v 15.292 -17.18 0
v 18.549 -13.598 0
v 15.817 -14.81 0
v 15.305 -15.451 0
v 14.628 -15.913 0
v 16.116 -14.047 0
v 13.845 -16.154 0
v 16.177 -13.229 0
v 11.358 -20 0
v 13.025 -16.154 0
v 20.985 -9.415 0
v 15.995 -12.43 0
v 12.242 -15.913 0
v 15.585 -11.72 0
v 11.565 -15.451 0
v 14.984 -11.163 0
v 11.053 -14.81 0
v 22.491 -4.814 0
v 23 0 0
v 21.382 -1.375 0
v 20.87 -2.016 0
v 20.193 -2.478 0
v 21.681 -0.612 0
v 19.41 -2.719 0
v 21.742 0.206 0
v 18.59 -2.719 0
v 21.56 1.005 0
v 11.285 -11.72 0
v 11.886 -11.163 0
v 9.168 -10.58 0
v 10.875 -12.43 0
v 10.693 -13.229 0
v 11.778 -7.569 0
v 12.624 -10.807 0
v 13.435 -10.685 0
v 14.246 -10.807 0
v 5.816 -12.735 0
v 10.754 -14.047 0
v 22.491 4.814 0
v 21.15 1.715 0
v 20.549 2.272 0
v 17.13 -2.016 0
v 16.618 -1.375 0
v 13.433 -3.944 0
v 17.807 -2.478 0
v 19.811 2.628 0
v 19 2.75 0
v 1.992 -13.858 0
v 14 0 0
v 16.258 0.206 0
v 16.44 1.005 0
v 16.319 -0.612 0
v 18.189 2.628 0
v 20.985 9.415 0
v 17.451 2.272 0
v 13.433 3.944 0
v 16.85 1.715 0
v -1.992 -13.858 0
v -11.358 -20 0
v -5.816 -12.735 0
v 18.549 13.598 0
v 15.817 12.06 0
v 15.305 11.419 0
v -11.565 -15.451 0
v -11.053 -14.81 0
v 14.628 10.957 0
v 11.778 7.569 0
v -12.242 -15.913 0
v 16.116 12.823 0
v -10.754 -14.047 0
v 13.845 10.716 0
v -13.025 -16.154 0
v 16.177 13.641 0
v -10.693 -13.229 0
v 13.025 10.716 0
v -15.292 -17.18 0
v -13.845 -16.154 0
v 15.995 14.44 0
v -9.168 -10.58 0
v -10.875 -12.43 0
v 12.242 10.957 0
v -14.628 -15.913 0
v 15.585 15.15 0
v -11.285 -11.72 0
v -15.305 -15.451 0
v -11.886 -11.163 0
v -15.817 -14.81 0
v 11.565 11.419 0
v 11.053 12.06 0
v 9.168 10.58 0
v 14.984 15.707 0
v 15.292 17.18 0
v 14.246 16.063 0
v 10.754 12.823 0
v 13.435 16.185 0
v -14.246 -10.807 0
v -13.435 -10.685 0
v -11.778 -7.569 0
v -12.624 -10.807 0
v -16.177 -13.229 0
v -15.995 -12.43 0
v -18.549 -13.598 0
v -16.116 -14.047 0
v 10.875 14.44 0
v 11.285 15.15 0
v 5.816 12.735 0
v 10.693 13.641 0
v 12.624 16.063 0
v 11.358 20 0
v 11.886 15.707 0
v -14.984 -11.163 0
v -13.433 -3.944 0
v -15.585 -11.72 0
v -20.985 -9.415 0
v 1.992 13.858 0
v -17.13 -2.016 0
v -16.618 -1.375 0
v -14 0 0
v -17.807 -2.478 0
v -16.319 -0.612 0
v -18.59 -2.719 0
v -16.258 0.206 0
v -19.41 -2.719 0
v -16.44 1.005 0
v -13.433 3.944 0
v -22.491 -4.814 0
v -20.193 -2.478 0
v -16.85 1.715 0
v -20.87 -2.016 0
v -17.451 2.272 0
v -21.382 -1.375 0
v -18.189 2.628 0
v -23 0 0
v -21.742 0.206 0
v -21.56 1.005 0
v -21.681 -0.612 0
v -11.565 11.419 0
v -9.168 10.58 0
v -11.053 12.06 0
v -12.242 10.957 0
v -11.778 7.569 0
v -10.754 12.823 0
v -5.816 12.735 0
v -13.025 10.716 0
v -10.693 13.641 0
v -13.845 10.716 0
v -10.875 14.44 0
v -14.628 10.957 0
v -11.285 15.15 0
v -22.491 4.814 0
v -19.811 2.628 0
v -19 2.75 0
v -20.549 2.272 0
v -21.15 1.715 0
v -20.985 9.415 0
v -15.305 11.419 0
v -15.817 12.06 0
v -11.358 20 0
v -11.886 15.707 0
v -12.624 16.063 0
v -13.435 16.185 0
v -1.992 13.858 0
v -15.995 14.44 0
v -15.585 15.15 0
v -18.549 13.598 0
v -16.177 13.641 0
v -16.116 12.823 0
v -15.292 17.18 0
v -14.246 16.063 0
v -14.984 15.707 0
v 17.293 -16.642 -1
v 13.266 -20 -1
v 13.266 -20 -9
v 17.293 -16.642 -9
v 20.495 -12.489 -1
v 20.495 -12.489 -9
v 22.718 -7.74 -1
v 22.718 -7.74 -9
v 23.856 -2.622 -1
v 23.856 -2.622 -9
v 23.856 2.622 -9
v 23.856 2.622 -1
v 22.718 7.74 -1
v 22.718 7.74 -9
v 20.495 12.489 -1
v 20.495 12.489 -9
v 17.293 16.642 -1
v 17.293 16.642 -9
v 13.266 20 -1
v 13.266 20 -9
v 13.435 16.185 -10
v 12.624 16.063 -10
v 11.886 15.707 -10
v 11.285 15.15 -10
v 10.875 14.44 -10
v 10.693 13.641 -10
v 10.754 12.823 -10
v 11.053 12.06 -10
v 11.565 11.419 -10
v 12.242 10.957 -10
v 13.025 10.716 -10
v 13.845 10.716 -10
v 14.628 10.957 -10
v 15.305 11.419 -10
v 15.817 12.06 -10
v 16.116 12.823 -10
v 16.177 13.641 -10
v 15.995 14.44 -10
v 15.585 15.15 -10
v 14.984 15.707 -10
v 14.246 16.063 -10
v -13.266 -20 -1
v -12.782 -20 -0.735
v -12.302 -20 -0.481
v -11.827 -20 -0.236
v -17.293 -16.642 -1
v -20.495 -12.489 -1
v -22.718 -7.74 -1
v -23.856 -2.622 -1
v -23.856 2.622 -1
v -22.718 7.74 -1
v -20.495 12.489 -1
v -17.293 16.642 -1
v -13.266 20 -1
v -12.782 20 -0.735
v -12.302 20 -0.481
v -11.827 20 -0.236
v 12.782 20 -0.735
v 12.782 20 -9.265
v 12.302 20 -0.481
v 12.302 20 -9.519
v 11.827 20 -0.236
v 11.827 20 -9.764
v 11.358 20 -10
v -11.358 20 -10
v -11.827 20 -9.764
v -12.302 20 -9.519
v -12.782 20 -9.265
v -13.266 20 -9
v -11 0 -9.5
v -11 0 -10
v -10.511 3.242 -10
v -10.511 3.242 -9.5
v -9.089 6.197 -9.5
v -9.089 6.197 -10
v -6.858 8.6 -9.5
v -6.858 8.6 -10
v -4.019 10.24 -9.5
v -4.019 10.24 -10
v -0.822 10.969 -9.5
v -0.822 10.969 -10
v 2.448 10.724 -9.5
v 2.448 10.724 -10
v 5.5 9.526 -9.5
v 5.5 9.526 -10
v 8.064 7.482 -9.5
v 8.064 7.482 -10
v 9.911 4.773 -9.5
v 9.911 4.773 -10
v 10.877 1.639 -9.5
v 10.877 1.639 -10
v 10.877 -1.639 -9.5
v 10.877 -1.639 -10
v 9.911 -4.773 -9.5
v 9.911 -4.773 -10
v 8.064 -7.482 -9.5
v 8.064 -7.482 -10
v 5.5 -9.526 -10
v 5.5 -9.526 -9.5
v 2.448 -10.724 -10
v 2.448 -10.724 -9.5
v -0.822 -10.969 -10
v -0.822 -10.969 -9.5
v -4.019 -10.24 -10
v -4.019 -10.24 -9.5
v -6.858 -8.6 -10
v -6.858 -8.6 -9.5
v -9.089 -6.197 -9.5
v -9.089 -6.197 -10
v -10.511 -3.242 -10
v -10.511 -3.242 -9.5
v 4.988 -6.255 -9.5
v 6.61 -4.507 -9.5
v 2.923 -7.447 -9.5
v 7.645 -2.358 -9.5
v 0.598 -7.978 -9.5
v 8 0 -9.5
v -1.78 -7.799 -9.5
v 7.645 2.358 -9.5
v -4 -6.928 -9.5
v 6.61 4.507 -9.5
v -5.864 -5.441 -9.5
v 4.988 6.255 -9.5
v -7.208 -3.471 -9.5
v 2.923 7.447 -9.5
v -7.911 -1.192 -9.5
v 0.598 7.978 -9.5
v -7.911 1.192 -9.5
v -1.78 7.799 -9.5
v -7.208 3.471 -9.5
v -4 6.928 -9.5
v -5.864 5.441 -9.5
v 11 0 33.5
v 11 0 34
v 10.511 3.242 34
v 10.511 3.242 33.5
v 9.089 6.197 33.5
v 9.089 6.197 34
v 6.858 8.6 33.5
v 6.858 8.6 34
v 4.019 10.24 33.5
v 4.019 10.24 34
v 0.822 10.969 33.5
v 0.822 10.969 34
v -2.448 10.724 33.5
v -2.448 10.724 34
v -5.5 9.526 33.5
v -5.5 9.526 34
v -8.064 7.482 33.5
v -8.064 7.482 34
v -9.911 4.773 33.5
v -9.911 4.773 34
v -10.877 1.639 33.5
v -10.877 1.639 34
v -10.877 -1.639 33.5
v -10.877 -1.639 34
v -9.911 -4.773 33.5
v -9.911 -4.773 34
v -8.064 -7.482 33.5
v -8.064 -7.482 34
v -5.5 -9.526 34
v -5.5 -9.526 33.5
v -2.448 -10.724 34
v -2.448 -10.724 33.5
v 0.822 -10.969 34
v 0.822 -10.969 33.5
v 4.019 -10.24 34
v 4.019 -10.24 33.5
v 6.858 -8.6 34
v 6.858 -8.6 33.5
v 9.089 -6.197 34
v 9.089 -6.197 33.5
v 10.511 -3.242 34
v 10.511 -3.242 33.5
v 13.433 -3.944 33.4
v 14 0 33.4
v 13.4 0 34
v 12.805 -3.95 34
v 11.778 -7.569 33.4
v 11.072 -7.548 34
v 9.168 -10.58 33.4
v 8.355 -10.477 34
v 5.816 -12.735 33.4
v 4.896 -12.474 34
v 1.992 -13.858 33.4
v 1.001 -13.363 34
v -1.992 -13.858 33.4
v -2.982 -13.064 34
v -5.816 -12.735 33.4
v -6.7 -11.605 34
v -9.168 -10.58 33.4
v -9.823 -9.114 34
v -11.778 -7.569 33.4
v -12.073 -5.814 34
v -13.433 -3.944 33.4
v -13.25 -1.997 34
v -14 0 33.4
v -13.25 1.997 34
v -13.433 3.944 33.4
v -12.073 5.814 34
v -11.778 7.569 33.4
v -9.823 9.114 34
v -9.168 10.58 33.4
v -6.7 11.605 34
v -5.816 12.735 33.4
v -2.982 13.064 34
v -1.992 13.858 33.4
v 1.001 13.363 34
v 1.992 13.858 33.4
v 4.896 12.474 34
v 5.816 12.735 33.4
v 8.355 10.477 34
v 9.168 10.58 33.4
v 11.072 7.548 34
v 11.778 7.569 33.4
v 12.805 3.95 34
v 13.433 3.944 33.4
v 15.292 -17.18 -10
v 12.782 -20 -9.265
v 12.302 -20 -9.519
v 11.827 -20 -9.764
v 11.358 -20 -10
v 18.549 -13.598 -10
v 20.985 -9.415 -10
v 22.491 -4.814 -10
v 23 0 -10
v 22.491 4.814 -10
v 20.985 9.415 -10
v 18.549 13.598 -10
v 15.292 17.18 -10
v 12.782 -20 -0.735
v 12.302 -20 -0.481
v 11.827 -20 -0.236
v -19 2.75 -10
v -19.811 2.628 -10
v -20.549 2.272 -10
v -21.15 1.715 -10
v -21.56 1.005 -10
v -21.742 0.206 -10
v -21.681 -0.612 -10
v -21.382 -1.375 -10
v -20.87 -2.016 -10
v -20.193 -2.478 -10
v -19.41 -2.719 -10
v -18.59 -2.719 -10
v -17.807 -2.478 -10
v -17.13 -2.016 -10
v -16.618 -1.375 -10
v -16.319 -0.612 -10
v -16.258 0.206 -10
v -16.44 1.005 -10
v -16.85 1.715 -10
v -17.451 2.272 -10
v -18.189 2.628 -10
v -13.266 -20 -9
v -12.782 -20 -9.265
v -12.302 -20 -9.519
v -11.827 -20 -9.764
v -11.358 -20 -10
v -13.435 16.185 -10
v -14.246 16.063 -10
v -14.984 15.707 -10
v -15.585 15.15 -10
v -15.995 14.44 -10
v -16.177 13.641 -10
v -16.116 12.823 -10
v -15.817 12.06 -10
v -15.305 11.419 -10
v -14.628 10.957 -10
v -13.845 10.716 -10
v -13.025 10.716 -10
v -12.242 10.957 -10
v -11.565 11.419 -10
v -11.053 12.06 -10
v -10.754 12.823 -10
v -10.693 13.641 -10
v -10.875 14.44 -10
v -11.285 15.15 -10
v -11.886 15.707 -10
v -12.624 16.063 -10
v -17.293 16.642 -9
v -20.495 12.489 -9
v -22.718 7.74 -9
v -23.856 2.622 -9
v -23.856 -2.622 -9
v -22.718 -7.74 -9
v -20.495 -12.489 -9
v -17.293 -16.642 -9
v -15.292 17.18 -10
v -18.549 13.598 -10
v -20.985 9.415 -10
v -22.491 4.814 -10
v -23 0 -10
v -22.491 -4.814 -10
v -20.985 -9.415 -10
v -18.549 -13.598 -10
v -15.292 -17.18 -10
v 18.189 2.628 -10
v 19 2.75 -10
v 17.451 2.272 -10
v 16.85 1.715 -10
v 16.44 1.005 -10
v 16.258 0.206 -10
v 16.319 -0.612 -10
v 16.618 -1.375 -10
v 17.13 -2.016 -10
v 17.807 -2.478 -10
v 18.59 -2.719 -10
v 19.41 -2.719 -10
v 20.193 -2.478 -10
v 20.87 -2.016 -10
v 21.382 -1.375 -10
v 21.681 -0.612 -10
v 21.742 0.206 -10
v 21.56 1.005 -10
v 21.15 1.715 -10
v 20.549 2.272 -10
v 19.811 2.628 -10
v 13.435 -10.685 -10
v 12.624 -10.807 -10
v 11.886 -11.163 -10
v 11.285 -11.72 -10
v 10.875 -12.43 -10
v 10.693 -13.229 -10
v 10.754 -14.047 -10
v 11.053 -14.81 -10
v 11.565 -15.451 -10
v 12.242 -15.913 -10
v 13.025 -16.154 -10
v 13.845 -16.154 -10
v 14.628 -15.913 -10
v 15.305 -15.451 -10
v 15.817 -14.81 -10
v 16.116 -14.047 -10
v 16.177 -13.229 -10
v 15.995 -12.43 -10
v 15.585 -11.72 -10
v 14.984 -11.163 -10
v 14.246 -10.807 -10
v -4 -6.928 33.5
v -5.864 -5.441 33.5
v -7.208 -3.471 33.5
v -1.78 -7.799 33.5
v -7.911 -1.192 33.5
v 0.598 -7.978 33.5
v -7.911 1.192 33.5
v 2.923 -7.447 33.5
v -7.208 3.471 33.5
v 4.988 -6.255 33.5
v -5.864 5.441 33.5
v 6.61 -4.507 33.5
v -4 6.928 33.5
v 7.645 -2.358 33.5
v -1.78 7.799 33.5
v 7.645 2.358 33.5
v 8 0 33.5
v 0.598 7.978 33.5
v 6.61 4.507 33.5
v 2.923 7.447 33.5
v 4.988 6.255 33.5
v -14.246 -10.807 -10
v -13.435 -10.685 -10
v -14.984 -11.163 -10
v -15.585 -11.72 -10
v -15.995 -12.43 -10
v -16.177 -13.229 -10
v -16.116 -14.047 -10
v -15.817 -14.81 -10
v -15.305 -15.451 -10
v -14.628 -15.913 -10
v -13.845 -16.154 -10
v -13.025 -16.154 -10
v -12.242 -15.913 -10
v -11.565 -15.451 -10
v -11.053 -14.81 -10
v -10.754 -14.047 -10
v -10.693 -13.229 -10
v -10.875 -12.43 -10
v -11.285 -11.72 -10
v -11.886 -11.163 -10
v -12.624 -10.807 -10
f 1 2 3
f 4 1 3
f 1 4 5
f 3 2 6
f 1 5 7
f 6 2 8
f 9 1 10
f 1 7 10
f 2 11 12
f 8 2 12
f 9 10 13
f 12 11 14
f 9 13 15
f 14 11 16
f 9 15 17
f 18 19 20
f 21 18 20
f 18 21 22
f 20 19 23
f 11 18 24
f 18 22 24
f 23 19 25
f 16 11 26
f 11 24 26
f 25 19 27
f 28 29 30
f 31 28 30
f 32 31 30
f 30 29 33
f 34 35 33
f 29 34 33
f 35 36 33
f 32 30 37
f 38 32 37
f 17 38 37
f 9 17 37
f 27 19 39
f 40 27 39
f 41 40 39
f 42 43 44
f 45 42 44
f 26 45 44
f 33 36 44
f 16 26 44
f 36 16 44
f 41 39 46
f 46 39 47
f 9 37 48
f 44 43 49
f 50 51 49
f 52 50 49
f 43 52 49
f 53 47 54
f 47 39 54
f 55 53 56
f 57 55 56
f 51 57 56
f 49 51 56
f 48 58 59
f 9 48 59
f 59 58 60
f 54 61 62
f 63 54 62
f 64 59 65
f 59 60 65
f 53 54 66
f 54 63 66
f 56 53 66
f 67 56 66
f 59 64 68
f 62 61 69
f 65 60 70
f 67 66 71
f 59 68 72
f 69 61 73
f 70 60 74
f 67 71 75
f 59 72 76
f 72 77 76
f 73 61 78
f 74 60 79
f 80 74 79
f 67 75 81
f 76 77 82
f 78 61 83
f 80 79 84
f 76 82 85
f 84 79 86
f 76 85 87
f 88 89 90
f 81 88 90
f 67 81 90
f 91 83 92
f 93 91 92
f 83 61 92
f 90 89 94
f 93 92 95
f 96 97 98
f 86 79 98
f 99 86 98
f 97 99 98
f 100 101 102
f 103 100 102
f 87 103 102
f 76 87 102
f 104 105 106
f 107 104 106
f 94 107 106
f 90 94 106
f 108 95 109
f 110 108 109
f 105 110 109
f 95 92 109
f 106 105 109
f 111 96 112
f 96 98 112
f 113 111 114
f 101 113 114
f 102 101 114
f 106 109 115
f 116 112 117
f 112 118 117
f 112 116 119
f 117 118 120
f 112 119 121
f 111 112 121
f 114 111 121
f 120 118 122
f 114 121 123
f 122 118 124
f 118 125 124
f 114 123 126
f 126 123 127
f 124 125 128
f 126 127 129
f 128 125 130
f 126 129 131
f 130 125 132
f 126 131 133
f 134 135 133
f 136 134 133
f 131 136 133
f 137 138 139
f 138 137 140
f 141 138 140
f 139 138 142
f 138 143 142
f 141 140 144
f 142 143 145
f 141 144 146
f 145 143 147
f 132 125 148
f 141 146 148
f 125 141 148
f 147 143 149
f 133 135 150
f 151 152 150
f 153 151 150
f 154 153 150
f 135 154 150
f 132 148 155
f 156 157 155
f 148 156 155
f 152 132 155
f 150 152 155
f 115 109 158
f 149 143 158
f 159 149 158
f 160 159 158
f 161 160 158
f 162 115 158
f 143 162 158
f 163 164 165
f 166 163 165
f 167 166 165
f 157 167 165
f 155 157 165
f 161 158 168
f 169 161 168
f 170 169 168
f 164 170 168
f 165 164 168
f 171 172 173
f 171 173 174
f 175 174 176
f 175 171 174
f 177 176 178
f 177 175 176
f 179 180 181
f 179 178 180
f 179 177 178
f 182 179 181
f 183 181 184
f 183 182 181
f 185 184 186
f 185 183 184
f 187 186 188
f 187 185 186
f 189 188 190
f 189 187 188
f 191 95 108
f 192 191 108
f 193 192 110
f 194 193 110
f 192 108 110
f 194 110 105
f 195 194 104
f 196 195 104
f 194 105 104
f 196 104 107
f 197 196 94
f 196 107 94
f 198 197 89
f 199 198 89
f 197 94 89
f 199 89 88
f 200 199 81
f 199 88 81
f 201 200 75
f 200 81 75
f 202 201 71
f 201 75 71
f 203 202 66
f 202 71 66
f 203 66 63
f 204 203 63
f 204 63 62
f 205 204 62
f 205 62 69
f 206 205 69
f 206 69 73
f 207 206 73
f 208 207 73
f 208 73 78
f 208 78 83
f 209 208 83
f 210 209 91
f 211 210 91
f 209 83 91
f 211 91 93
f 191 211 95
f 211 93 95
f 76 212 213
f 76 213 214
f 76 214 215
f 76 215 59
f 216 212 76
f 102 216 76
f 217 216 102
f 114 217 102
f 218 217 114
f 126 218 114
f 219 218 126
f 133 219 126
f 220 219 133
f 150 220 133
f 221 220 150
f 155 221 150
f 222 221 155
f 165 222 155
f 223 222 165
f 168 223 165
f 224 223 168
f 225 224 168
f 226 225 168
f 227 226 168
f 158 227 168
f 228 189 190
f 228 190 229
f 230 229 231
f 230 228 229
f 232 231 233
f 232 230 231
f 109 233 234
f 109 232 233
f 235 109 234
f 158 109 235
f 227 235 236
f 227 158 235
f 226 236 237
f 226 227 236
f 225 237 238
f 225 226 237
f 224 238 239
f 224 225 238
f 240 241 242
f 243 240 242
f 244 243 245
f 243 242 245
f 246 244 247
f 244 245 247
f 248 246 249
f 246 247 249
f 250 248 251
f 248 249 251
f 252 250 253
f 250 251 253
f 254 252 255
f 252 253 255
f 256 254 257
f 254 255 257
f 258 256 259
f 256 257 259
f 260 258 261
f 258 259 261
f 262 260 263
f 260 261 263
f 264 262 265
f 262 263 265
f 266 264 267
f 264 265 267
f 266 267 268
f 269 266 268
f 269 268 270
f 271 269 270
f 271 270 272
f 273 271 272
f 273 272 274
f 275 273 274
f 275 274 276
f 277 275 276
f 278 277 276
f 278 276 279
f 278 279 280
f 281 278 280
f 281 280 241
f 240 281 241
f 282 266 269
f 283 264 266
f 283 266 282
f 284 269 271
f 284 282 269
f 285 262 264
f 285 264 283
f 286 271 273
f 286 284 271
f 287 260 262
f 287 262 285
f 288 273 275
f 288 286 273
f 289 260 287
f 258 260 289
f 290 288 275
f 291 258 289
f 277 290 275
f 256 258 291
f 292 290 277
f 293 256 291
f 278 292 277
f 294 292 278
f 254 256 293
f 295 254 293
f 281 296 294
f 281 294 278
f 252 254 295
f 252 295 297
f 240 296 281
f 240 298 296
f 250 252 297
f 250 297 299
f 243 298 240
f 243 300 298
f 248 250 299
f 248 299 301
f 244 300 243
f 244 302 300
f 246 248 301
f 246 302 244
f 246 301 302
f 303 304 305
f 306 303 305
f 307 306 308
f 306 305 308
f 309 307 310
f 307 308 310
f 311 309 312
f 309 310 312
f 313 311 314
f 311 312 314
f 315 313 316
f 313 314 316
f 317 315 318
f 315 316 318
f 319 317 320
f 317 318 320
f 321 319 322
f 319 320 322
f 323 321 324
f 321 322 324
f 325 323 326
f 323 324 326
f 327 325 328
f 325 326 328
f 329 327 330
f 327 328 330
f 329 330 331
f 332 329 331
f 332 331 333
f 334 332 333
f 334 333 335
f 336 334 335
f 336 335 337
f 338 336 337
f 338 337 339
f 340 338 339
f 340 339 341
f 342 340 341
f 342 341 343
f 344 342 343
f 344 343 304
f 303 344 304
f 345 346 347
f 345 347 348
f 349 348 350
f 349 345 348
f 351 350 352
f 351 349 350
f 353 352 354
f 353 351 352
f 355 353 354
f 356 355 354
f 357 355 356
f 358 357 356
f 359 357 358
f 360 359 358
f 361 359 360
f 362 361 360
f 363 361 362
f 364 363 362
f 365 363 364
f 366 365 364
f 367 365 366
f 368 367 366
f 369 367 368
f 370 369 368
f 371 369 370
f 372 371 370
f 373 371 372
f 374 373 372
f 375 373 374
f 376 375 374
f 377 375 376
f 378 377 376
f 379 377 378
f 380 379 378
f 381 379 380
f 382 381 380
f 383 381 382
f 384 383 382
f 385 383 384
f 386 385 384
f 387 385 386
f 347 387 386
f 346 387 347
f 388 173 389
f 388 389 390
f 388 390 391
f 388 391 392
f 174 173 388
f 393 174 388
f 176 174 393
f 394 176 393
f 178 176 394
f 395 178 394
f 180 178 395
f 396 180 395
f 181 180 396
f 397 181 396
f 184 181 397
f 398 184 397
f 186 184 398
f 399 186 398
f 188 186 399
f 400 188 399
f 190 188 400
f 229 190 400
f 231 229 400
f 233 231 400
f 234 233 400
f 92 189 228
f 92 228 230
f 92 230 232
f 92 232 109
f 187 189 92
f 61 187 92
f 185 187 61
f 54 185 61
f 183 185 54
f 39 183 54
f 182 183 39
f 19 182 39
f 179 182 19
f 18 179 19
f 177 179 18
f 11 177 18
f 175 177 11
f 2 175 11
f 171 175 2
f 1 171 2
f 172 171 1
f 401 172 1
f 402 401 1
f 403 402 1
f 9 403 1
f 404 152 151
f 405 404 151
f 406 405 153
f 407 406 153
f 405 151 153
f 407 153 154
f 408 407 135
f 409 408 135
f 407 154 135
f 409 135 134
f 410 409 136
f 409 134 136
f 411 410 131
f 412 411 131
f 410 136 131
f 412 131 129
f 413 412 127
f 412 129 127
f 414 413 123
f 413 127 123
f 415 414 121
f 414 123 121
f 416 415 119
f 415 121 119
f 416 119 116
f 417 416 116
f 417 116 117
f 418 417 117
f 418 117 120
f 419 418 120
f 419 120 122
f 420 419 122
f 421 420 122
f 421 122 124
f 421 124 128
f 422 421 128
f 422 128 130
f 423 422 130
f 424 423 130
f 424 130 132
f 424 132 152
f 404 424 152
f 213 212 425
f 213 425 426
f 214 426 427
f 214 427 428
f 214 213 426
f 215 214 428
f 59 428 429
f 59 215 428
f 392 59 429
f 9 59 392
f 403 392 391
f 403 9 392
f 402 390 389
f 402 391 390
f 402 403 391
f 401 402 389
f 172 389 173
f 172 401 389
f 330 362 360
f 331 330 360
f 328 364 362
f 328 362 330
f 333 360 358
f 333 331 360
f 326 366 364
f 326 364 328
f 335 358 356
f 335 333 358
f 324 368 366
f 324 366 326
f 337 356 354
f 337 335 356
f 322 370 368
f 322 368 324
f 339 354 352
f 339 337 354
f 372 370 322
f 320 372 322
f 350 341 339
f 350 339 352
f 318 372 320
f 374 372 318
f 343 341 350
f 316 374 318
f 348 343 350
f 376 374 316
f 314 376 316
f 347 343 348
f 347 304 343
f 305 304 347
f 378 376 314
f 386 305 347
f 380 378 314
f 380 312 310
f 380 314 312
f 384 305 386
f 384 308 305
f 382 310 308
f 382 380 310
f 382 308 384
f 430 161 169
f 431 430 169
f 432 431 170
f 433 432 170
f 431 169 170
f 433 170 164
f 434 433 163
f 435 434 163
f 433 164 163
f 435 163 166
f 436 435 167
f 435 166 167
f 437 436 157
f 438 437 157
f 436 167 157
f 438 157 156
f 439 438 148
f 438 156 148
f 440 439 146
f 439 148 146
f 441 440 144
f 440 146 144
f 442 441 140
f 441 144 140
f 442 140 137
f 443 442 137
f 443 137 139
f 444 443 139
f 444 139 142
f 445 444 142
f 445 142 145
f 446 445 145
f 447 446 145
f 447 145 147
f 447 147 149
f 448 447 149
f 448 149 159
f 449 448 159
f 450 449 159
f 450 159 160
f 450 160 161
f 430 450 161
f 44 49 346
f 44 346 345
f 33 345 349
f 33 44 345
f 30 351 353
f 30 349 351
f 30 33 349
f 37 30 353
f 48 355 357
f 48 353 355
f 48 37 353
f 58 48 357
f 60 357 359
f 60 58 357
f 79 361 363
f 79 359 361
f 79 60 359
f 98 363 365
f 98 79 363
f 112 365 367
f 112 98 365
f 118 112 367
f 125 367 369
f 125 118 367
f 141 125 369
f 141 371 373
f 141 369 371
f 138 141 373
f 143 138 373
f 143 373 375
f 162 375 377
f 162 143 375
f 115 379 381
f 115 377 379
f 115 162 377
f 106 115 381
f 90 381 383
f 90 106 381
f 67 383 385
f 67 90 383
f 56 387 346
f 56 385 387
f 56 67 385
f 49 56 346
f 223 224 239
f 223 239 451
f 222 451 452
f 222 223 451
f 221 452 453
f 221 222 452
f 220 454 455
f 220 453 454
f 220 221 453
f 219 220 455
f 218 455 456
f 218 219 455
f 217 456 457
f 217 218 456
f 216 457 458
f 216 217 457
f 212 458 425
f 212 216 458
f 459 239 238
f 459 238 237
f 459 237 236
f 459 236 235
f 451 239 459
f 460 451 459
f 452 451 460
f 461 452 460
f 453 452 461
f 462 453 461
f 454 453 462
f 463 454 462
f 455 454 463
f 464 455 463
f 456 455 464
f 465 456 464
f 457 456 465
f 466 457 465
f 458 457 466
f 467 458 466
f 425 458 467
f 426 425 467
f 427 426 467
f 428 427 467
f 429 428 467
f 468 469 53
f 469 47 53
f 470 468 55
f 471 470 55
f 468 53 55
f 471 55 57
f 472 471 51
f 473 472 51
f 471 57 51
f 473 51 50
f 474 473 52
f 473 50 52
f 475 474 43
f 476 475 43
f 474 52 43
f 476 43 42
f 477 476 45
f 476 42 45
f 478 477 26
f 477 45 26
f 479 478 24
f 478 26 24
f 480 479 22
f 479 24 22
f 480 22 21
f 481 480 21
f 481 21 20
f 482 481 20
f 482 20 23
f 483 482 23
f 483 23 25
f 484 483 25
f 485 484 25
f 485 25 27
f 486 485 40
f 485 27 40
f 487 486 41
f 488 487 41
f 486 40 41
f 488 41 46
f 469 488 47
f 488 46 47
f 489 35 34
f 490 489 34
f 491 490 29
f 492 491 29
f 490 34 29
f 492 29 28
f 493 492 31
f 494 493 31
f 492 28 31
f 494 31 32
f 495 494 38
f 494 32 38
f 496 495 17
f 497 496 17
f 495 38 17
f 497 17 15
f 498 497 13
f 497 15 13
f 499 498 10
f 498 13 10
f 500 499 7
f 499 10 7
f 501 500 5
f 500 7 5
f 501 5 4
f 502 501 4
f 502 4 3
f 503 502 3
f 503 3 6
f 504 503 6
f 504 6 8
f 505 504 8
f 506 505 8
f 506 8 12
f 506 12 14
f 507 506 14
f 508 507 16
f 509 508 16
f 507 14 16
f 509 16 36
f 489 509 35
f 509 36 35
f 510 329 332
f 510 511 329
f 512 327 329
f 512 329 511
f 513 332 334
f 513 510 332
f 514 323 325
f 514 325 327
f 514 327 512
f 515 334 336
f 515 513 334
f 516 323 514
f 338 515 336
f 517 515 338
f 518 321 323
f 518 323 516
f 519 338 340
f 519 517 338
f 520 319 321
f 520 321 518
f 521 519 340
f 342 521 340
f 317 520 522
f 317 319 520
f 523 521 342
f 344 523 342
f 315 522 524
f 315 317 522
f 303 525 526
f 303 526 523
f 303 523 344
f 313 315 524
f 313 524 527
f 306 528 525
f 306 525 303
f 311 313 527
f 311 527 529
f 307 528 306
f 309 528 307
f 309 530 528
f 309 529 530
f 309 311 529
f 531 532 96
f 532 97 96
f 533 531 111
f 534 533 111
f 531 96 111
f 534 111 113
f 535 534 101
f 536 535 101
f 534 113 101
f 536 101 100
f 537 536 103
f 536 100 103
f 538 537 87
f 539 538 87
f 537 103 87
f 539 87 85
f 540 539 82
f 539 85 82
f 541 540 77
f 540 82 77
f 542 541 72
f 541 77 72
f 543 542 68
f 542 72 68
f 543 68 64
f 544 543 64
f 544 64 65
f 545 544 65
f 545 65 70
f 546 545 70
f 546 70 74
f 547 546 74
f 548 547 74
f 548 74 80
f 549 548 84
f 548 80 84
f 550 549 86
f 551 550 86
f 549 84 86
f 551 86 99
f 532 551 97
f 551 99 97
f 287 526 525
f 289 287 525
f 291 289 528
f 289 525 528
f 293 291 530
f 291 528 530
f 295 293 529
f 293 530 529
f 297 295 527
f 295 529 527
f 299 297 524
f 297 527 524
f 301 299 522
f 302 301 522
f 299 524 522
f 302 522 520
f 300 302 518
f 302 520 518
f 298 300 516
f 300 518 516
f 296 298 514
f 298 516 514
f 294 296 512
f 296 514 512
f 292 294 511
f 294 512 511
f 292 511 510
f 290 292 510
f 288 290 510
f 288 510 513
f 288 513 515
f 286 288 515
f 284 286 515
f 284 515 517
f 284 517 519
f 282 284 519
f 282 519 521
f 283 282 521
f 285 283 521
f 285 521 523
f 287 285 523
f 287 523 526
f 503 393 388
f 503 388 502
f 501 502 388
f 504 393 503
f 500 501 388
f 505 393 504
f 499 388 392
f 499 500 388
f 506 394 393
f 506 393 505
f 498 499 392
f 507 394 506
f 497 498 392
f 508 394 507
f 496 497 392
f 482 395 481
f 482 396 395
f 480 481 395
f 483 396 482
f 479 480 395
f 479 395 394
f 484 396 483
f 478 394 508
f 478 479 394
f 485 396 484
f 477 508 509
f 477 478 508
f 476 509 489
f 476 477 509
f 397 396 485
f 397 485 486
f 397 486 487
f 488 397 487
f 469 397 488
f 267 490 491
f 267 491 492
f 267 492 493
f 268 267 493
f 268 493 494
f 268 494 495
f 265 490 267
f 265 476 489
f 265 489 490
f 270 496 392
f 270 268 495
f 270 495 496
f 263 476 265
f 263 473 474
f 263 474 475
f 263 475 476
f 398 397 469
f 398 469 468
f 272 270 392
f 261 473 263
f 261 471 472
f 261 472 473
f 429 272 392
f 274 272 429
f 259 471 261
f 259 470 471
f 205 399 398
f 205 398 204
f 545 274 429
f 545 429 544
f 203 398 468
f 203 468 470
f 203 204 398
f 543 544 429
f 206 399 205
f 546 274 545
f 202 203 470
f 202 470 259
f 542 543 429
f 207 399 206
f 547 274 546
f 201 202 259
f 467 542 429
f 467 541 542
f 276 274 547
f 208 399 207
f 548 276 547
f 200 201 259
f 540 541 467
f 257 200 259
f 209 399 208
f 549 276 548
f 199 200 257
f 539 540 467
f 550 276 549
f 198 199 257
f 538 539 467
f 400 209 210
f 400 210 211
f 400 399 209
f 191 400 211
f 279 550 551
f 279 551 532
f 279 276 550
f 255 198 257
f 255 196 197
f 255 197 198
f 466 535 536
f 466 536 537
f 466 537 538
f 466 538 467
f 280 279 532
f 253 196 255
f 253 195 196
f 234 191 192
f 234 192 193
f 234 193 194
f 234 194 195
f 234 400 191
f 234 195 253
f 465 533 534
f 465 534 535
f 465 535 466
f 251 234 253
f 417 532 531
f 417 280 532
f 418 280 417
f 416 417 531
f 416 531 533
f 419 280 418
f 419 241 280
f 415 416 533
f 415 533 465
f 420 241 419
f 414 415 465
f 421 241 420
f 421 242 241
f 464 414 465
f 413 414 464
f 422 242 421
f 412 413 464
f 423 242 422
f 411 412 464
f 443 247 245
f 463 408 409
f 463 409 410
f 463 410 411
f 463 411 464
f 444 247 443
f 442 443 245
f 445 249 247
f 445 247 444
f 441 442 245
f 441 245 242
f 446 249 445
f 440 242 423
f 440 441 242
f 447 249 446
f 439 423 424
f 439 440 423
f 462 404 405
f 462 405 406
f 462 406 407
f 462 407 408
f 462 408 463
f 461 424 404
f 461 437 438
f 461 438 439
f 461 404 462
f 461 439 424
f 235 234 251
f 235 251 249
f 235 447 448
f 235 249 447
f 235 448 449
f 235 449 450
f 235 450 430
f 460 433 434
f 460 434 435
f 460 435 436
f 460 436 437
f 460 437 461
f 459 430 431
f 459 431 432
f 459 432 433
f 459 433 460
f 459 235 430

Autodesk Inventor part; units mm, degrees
ref_plane "YZ Plane" through (0, 0, 0) normal (1, 0, 0) x (0, 1, 0)
ref_plane "XZ Plane" through (0, 0, 0) normal (0, 1, 0) x (-1, 0, 0)
ref_plane "XY Plane" through (0, 0, 0) normal (0, 0, 1) x (1, 0, 0)
sketch "Szkic1" plane through (0, 0, 0) normal (0, 0, 1) x (1, 0, 0)
  circle A0 centre (0, 0) radius 14
  dimension "d0" = 28
extrude "Wyciągnięcie proste1" add sketch "Szkic1" along normal blind 34
sketch "Szkic2" plane through (0, 0, 0) normal (0, 0, -1) x (-1, 0, 0)
  line L0 (13.2665, -20) -> (-13.2665, -20)
  line L1 (-13.2665, 20) -> (13.2665, 20)
  arc A0 (-13.2665, 20) -> (-13.2665, -20) centre (0, 0) ccw
  arc A1 (13.2665, -20) -> (13.2665, 20) centre (0, 0) ccw
  dimension "d18" = 20
  dimension "d19" = 20
  dimension "d20" = 24
extrude "Wyciągnięcie proste2" add sketch "Szkic2" along normal blind 10
sketch "Szkic3" plane through (0, 0, 34) normal (0, 0, 1) x (1, 0, 0)
  circle A0 centre (0, 0) radius 8
  circle A1 centre (0, 0) radius 11
  dimension "d9" = 16
  dimension "d10" = 3
extrude "Wyciągnięcie proste3" cut sketch "Szkic3" against normal up to surface (44 mm away) contours A0
extrude "Wyciągnięcie proste4" cut sketch "Szkic3" against normal blind 0.5
sketch "Szkic4" plane through (0, 0, -10) normal (0, 0, -1) x (-1, 0, 0)
  circle A0 centre (0, 0) radius 8 projected
  circle A1 centre (0, 0) radius 11
  circle A2 centre (0, 0) radius 19
  line L0 (-13.435, -13.435) -> (0, 0)
  line L1 (0, 0) -> (13.435, 13.435)
  line L2 (0, 0) -> (13.435, -13.435)
  line L3 (0, 0) -> (-13.435, 13.435)
  line L4 (-27.1999, 0) -> (26.3201, 0)
  arc A3 (-13.2665, 20) -> (-13.2665, -20) centre (0, 0) ccw projected
  line L5 (-13.2665, -20) -> (13.2665, -20) projected
  arc A4 (13.2665, -20) -> (13.2665, 20) centre (0, 0) ccw projected
  line L6 (13.2665, 20) -> (-13.2665, 20) projected
  point P0 (-19, 0)
  point P1 (19, 0)
  dimension "d15" = 3
  dimension "d23" = 19
  dimension "d28" = 38
  dimension "d29" = 45
  dimension "d30" = 45
  dimension "d31" = 45
  dimension "d32" = 45
extrude "Wyciągnięcie proste5" cut sketch "Szkic4" against normal blind 0.5 contours L4 A1 L2 A0 | A0 L1 A1 L4 | A0 L3 A1 L1 | L2 A1 L0 A0 | A0 L4 A1 L3 | L0 A1 L4 A0
hole "Otwór1" at (13.435, -13.435, -10) at (19, 0, -10) at (13.435, 13.435, -10) at (-13.435, 13.435, -10) at (-19, 0, -10) at (-13.435, -13.435, -10) direction (0, 0, 1) diameter 5.5 end through all
chamfer "Faza1" distance 1 angle 45 4 edges at (-24, 0, 0) (-24, 0, -10) (24, 0, 0) (24, 0, -10)
chamfer "Faza2" distance 0.6 angle 45 1 edges at (-14, 0, 34)
properties part number "COTS_GENERIC_SFU1605_Ball_Screw_Nut"
